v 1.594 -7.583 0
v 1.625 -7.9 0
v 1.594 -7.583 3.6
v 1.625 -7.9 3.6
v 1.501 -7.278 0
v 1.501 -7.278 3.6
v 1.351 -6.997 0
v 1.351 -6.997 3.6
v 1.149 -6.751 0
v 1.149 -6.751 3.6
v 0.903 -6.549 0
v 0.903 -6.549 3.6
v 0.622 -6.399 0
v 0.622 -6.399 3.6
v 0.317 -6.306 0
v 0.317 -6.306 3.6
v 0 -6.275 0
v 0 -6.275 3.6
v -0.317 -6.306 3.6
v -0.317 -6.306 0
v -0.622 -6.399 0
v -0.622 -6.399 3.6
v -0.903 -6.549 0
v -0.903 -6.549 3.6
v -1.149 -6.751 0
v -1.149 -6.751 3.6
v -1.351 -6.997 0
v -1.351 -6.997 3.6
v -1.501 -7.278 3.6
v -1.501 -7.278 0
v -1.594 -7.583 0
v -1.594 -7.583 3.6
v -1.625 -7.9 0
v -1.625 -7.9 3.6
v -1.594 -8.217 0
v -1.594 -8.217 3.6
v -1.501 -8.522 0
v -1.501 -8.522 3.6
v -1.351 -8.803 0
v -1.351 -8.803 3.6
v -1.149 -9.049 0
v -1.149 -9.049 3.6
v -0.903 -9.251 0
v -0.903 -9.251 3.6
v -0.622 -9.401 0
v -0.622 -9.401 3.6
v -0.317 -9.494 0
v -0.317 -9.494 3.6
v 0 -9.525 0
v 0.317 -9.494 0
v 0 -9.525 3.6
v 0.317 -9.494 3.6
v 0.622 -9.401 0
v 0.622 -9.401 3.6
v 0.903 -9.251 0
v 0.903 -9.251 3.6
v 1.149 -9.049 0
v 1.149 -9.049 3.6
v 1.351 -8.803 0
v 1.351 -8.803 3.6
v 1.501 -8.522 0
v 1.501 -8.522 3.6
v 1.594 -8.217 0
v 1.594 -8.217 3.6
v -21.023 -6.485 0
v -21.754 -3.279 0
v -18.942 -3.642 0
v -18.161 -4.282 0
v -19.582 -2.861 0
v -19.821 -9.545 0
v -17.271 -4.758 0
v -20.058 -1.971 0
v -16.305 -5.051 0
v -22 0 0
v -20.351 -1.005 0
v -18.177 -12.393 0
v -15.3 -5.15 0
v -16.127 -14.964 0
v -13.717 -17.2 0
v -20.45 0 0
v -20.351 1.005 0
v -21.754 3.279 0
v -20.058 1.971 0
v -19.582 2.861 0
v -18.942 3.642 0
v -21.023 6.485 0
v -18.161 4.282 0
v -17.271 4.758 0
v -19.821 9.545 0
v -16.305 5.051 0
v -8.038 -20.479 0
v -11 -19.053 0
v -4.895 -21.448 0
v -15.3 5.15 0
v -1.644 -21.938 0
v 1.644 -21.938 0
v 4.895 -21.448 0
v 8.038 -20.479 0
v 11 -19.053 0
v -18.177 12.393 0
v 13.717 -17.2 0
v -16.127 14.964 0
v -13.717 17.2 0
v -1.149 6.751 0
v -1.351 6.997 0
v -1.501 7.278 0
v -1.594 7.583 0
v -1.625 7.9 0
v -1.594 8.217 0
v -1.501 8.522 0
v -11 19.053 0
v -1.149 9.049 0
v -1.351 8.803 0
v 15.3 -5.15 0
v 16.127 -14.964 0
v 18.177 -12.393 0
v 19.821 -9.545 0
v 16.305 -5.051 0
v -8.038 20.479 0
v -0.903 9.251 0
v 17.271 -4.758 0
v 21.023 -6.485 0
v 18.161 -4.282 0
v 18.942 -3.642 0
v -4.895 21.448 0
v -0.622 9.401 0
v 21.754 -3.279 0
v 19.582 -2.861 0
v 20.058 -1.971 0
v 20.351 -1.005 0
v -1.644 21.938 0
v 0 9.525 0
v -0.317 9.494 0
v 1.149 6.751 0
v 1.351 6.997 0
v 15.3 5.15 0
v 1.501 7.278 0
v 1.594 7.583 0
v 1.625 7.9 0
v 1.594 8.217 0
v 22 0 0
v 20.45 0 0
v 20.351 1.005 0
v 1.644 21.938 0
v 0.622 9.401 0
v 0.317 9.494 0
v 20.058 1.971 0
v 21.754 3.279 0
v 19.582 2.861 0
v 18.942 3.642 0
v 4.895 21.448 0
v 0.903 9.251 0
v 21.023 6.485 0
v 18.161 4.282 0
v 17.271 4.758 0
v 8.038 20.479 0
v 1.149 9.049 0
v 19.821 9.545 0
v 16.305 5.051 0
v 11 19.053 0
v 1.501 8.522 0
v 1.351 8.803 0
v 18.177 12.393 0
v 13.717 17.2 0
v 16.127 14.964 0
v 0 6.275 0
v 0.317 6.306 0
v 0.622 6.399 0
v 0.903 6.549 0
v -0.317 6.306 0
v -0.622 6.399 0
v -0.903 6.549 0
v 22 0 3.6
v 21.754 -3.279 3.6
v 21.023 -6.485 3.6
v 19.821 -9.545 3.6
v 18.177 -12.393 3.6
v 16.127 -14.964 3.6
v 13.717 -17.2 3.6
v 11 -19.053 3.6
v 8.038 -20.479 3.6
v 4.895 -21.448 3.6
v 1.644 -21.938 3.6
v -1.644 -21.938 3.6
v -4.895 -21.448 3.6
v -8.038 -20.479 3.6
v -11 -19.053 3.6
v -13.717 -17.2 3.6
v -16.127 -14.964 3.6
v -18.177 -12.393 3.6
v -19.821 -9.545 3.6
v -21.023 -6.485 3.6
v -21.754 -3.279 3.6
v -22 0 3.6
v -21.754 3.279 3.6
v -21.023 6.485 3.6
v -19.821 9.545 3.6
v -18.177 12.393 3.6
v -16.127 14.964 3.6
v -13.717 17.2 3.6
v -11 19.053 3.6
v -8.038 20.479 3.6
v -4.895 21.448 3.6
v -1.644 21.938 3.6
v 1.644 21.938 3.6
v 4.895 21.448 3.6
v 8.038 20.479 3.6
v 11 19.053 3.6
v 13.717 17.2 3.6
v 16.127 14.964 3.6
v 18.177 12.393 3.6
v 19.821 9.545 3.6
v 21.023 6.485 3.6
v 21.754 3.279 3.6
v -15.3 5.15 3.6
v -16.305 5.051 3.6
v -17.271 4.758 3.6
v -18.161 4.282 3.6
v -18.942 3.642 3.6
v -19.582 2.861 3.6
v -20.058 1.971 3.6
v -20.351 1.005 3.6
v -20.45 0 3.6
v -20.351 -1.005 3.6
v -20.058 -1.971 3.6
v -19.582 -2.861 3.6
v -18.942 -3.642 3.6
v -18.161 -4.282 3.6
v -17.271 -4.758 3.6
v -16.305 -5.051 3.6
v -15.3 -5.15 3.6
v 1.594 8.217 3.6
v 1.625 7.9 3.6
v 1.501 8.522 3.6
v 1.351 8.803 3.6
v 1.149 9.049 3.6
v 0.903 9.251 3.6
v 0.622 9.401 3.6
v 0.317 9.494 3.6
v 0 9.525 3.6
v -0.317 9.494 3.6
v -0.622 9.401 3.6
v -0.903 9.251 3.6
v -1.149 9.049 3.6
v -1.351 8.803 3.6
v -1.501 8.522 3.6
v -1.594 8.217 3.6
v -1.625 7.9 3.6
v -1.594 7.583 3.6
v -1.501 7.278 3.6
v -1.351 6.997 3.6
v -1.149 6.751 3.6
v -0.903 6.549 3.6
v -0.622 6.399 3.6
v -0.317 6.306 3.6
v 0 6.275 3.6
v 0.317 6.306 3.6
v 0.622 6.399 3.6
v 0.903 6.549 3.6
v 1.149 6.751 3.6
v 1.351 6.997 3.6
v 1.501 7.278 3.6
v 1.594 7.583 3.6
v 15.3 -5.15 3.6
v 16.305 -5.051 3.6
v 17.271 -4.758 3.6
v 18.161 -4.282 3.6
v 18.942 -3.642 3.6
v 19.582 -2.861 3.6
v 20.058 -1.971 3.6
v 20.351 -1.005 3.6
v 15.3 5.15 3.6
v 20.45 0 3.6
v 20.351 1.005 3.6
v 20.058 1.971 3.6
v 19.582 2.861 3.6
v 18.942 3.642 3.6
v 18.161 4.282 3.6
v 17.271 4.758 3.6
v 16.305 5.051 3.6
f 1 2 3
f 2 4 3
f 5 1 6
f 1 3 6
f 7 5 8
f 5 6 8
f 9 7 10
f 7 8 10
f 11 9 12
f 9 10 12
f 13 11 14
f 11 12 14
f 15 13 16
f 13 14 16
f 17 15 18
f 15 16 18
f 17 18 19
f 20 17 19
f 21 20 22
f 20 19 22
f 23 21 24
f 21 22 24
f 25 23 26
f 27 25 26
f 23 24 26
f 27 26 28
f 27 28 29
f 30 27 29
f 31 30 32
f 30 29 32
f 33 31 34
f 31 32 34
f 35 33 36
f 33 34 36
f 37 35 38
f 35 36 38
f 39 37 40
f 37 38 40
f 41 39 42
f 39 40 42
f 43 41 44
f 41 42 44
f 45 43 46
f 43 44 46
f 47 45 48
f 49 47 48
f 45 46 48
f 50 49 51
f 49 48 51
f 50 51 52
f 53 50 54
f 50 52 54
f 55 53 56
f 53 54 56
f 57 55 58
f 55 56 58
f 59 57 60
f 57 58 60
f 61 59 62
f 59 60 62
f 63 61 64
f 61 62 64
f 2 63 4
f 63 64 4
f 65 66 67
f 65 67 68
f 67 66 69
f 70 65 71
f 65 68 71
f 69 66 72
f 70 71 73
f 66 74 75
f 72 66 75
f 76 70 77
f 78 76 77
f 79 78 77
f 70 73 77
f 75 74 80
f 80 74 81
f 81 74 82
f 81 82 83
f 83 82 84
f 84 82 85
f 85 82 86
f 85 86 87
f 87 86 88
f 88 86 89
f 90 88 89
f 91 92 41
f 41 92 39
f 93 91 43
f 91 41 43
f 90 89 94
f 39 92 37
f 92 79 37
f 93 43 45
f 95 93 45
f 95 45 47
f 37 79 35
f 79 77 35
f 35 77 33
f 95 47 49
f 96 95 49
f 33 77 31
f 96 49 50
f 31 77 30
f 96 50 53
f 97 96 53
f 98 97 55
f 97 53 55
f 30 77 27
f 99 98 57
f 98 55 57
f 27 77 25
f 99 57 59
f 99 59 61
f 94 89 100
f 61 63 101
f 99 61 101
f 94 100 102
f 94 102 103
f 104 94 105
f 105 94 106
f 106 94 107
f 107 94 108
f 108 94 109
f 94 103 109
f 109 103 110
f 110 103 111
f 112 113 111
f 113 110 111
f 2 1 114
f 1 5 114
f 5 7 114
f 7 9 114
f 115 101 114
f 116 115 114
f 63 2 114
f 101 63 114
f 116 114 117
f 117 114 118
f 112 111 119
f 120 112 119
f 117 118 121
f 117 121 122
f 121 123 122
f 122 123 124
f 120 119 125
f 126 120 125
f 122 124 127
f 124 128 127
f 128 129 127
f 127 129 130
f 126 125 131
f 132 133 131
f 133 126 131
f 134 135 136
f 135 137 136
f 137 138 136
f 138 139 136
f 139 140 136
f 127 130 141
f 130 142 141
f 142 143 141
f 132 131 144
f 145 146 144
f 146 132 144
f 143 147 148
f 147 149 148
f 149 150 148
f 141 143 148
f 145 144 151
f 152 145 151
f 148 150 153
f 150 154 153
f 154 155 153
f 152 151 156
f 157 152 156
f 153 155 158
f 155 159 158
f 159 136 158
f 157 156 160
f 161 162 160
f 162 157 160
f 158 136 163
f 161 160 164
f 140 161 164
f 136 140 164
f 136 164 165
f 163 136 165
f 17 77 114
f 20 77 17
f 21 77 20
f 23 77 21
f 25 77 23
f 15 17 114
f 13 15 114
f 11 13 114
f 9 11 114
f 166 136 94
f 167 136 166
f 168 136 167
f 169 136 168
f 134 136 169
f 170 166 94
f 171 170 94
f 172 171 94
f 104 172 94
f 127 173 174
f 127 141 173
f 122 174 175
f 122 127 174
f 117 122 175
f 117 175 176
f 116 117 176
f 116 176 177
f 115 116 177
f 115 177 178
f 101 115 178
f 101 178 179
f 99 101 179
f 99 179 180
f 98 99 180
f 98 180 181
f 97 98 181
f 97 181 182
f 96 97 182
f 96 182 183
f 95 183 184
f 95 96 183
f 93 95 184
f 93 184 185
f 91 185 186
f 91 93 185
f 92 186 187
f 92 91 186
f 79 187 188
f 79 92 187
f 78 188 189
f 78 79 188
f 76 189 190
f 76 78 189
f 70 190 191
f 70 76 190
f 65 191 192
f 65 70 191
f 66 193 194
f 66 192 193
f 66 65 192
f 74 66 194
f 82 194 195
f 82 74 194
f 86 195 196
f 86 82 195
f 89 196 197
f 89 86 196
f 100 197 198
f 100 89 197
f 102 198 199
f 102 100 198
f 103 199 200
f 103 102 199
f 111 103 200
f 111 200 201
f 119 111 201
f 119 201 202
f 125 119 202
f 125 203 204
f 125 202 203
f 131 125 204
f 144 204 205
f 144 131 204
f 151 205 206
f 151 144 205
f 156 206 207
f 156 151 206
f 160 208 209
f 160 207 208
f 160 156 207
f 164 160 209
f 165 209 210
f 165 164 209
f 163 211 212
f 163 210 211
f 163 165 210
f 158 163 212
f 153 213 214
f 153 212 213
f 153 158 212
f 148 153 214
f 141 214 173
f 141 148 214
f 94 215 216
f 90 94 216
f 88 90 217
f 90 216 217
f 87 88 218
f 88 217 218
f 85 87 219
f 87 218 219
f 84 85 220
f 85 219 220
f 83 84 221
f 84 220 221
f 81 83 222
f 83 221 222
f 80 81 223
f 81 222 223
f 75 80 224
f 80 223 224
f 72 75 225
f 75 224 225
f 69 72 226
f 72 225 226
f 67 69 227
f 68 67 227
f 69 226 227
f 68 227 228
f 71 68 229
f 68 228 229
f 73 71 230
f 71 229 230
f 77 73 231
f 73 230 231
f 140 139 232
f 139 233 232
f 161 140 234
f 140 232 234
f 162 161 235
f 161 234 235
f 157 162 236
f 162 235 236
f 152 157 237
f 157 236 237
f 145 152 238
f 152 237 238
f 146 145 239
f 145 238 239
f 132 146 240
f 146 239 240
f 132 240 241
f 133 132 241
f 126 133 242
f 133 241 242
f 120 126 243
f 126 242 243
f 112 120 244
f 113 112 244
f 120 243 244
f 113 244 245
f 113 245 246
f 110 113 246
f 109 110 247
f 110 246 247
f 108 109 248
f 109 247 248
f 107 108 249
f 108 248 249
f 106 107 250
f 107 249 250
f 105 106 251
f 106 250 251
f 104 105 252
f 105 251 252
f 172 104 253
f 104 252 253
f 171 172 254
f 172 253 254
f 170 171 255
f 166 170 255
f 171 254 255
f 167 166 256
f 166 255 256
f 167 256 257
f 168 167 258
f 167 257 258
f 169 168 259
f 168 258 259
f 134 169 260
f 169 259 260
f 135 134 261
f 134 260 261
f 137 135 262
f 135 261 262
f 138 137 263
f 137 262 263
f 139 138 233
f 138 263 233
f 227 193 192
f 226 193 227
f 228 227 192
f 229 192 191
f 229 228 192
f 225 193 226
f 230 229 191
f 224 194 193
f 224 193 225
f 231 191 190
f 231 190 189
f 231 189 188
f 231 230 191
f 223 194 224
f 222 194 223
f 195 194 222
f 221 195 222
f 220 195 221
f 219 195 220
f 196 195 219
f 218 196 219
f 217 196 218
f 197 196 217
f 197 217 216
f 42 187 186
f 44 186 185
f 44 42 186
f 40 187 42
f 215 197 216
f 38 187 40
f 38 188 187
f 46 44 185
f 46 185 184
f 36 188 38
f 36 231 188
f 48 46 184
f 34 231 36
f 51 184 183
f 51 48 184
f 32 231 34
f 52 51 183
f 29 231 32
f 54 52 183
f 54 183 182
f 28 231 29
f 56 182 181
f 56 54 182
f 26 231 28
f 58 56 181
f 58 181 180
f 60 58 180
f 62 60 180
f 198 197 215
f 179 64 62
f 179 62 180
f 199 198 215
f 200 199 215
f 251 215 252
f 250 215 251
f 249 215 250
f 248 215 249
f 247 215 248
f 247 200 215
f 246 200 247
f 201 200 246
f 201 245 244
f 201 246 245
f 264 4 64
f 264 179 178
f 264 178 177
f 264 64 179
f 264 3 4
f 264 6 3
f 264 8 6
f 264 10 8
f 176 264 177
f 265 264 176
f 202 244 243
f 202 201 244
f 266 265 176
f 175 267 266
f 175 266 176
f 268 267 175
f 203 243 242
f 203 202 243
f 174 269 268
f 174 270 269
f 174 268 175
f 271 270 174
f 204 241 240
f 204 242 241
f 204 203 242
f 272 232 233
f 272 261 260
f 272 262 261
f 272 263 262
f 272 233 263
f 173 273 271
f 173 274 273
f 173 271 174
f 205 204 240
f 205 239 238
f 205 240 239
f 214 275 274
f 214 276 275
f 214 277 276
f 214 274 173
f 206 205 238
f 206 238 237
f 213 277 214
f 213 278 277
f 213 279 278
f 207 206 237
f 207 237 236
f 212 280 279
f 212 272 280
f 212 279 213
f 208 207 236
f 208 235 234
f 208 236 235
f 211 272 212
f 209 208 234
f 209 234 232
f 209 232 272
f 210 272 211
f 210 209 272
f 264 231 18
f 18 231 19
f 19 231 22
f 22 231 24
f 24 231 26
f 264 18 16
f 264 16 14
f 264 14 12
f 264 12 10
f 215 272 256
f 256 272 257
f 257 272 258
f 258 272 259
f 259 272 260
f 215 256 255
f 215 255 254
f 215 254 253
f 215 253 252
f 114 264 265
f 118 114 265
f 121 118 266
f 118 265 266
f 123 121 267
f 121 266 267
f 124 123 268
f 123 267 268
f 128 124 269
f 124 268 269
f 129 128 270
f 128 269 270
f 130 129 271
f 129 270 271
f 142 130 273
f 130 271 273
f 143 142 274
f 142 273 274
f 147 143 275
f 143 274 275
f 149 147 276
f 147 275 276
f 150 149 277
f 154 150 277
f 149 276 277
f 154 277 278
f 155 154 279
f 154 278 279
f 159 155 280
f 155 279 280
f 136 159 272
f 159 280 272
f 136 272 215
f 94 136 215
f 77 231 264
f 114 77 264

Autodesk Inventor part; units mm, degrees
ref_plane "YZ Plane" through (0, 0, 0) normal (1, 0, 0) x (0, 1, 0)
ref_plane "XZ Plane" through (0, 0, 0) normal (0, 1, 0) x (-1, 0, 0)
ref_plane "XY Plane" through (0, 0, 0) normal (0, 0, 1) x (1, 0, 0)
sketch "Sketch1" plane through (0, 0, 0) normal (0, 0, 1) x (1, 0, 0)
  circle A0 centre (0, 0) radius 22
  dimension "d0" = 44
extrude "Extrusion1" add sketch "Sketch1" along normal blind 3.6
sketch "Sketch2" plane through (0, 0, 3.6) normal (0, 0, 1) x (1, 0, 0)
  line L0 (15.3, 0) -> (-15.3, 0) construction
  line L1 (15.3, 5.15) -> (-15.3, 5.15)
  line L2 (-15.3, -5.15) -> (15.3, -5.15)
  arc A0 (15.3, -5.15) -> (15.3, 5.15) centre (15.3, 0) ccw
  arc A1 (-15.3, 5.15) -> (-15.3, -5.15) centre (-15.3, 0) ccw
  point P0 (0, 0)
  dimension "d3" = 15.3
  dimension "d4" = 10.3
extrude "Extrusion2" cut sketch "Sketch2" against normal blind 3.6
sketch "Sketch3" plane through (0, 0, 3.6) normal (0, 0, 1) x (1, 0, 0)
  line L0 (-2.6, 9.8) -> (2.6, 9.8)
  line L1 (2.6, 9.8) -> (2.6, 6)
  line L2 (2.6, 6) -> (-2.6, 6)
  line L3 (-2.6, 6) -> (-2.6, 9.8)
  line L4 (-2.6, 9.8) -> (2.6, 6) construction
  line L5 (2.6, 9.8) -> (-2.6, 6) construction
  line L6 (-30.8, 0) -> (30.8, 0) projected
  line L7 (-30.8, 0) -> (30.8, 0) projected
  line L8 (-2.6, -9.8) -> (2.6, -9.8)
  line L9 (2.6, -9.8) -> (2.6, -6)
  line L10 (2.6, -6) -> (-2.6, -6)
  line L11 (-2.6, -6) -> (-2.6, -9.8)
  line L12 (-2.6, -9.8) -> (2.6, -6) construction
  line L13 (2.6, -9.8) -> (-2.6, -6) construction
  circle A0 centre (0, -7.9) radius 1.625
  circle A1 centre (0, 7.9) radius 1.625
  point P0 (0, 0)
  dimension "d7" = 5.2
  dimension "d8" = 3.8
  dimension "d9" = 6
  dimension "d10" = 6
  dimension "d13" = 0
  dimension "d14" = 3.25
  dimension "d15" = 3.25
extrude "Extrusion3" cut sketch "Sketch3" against normal blind 10 contours A0 | A1
properties part number "1"
